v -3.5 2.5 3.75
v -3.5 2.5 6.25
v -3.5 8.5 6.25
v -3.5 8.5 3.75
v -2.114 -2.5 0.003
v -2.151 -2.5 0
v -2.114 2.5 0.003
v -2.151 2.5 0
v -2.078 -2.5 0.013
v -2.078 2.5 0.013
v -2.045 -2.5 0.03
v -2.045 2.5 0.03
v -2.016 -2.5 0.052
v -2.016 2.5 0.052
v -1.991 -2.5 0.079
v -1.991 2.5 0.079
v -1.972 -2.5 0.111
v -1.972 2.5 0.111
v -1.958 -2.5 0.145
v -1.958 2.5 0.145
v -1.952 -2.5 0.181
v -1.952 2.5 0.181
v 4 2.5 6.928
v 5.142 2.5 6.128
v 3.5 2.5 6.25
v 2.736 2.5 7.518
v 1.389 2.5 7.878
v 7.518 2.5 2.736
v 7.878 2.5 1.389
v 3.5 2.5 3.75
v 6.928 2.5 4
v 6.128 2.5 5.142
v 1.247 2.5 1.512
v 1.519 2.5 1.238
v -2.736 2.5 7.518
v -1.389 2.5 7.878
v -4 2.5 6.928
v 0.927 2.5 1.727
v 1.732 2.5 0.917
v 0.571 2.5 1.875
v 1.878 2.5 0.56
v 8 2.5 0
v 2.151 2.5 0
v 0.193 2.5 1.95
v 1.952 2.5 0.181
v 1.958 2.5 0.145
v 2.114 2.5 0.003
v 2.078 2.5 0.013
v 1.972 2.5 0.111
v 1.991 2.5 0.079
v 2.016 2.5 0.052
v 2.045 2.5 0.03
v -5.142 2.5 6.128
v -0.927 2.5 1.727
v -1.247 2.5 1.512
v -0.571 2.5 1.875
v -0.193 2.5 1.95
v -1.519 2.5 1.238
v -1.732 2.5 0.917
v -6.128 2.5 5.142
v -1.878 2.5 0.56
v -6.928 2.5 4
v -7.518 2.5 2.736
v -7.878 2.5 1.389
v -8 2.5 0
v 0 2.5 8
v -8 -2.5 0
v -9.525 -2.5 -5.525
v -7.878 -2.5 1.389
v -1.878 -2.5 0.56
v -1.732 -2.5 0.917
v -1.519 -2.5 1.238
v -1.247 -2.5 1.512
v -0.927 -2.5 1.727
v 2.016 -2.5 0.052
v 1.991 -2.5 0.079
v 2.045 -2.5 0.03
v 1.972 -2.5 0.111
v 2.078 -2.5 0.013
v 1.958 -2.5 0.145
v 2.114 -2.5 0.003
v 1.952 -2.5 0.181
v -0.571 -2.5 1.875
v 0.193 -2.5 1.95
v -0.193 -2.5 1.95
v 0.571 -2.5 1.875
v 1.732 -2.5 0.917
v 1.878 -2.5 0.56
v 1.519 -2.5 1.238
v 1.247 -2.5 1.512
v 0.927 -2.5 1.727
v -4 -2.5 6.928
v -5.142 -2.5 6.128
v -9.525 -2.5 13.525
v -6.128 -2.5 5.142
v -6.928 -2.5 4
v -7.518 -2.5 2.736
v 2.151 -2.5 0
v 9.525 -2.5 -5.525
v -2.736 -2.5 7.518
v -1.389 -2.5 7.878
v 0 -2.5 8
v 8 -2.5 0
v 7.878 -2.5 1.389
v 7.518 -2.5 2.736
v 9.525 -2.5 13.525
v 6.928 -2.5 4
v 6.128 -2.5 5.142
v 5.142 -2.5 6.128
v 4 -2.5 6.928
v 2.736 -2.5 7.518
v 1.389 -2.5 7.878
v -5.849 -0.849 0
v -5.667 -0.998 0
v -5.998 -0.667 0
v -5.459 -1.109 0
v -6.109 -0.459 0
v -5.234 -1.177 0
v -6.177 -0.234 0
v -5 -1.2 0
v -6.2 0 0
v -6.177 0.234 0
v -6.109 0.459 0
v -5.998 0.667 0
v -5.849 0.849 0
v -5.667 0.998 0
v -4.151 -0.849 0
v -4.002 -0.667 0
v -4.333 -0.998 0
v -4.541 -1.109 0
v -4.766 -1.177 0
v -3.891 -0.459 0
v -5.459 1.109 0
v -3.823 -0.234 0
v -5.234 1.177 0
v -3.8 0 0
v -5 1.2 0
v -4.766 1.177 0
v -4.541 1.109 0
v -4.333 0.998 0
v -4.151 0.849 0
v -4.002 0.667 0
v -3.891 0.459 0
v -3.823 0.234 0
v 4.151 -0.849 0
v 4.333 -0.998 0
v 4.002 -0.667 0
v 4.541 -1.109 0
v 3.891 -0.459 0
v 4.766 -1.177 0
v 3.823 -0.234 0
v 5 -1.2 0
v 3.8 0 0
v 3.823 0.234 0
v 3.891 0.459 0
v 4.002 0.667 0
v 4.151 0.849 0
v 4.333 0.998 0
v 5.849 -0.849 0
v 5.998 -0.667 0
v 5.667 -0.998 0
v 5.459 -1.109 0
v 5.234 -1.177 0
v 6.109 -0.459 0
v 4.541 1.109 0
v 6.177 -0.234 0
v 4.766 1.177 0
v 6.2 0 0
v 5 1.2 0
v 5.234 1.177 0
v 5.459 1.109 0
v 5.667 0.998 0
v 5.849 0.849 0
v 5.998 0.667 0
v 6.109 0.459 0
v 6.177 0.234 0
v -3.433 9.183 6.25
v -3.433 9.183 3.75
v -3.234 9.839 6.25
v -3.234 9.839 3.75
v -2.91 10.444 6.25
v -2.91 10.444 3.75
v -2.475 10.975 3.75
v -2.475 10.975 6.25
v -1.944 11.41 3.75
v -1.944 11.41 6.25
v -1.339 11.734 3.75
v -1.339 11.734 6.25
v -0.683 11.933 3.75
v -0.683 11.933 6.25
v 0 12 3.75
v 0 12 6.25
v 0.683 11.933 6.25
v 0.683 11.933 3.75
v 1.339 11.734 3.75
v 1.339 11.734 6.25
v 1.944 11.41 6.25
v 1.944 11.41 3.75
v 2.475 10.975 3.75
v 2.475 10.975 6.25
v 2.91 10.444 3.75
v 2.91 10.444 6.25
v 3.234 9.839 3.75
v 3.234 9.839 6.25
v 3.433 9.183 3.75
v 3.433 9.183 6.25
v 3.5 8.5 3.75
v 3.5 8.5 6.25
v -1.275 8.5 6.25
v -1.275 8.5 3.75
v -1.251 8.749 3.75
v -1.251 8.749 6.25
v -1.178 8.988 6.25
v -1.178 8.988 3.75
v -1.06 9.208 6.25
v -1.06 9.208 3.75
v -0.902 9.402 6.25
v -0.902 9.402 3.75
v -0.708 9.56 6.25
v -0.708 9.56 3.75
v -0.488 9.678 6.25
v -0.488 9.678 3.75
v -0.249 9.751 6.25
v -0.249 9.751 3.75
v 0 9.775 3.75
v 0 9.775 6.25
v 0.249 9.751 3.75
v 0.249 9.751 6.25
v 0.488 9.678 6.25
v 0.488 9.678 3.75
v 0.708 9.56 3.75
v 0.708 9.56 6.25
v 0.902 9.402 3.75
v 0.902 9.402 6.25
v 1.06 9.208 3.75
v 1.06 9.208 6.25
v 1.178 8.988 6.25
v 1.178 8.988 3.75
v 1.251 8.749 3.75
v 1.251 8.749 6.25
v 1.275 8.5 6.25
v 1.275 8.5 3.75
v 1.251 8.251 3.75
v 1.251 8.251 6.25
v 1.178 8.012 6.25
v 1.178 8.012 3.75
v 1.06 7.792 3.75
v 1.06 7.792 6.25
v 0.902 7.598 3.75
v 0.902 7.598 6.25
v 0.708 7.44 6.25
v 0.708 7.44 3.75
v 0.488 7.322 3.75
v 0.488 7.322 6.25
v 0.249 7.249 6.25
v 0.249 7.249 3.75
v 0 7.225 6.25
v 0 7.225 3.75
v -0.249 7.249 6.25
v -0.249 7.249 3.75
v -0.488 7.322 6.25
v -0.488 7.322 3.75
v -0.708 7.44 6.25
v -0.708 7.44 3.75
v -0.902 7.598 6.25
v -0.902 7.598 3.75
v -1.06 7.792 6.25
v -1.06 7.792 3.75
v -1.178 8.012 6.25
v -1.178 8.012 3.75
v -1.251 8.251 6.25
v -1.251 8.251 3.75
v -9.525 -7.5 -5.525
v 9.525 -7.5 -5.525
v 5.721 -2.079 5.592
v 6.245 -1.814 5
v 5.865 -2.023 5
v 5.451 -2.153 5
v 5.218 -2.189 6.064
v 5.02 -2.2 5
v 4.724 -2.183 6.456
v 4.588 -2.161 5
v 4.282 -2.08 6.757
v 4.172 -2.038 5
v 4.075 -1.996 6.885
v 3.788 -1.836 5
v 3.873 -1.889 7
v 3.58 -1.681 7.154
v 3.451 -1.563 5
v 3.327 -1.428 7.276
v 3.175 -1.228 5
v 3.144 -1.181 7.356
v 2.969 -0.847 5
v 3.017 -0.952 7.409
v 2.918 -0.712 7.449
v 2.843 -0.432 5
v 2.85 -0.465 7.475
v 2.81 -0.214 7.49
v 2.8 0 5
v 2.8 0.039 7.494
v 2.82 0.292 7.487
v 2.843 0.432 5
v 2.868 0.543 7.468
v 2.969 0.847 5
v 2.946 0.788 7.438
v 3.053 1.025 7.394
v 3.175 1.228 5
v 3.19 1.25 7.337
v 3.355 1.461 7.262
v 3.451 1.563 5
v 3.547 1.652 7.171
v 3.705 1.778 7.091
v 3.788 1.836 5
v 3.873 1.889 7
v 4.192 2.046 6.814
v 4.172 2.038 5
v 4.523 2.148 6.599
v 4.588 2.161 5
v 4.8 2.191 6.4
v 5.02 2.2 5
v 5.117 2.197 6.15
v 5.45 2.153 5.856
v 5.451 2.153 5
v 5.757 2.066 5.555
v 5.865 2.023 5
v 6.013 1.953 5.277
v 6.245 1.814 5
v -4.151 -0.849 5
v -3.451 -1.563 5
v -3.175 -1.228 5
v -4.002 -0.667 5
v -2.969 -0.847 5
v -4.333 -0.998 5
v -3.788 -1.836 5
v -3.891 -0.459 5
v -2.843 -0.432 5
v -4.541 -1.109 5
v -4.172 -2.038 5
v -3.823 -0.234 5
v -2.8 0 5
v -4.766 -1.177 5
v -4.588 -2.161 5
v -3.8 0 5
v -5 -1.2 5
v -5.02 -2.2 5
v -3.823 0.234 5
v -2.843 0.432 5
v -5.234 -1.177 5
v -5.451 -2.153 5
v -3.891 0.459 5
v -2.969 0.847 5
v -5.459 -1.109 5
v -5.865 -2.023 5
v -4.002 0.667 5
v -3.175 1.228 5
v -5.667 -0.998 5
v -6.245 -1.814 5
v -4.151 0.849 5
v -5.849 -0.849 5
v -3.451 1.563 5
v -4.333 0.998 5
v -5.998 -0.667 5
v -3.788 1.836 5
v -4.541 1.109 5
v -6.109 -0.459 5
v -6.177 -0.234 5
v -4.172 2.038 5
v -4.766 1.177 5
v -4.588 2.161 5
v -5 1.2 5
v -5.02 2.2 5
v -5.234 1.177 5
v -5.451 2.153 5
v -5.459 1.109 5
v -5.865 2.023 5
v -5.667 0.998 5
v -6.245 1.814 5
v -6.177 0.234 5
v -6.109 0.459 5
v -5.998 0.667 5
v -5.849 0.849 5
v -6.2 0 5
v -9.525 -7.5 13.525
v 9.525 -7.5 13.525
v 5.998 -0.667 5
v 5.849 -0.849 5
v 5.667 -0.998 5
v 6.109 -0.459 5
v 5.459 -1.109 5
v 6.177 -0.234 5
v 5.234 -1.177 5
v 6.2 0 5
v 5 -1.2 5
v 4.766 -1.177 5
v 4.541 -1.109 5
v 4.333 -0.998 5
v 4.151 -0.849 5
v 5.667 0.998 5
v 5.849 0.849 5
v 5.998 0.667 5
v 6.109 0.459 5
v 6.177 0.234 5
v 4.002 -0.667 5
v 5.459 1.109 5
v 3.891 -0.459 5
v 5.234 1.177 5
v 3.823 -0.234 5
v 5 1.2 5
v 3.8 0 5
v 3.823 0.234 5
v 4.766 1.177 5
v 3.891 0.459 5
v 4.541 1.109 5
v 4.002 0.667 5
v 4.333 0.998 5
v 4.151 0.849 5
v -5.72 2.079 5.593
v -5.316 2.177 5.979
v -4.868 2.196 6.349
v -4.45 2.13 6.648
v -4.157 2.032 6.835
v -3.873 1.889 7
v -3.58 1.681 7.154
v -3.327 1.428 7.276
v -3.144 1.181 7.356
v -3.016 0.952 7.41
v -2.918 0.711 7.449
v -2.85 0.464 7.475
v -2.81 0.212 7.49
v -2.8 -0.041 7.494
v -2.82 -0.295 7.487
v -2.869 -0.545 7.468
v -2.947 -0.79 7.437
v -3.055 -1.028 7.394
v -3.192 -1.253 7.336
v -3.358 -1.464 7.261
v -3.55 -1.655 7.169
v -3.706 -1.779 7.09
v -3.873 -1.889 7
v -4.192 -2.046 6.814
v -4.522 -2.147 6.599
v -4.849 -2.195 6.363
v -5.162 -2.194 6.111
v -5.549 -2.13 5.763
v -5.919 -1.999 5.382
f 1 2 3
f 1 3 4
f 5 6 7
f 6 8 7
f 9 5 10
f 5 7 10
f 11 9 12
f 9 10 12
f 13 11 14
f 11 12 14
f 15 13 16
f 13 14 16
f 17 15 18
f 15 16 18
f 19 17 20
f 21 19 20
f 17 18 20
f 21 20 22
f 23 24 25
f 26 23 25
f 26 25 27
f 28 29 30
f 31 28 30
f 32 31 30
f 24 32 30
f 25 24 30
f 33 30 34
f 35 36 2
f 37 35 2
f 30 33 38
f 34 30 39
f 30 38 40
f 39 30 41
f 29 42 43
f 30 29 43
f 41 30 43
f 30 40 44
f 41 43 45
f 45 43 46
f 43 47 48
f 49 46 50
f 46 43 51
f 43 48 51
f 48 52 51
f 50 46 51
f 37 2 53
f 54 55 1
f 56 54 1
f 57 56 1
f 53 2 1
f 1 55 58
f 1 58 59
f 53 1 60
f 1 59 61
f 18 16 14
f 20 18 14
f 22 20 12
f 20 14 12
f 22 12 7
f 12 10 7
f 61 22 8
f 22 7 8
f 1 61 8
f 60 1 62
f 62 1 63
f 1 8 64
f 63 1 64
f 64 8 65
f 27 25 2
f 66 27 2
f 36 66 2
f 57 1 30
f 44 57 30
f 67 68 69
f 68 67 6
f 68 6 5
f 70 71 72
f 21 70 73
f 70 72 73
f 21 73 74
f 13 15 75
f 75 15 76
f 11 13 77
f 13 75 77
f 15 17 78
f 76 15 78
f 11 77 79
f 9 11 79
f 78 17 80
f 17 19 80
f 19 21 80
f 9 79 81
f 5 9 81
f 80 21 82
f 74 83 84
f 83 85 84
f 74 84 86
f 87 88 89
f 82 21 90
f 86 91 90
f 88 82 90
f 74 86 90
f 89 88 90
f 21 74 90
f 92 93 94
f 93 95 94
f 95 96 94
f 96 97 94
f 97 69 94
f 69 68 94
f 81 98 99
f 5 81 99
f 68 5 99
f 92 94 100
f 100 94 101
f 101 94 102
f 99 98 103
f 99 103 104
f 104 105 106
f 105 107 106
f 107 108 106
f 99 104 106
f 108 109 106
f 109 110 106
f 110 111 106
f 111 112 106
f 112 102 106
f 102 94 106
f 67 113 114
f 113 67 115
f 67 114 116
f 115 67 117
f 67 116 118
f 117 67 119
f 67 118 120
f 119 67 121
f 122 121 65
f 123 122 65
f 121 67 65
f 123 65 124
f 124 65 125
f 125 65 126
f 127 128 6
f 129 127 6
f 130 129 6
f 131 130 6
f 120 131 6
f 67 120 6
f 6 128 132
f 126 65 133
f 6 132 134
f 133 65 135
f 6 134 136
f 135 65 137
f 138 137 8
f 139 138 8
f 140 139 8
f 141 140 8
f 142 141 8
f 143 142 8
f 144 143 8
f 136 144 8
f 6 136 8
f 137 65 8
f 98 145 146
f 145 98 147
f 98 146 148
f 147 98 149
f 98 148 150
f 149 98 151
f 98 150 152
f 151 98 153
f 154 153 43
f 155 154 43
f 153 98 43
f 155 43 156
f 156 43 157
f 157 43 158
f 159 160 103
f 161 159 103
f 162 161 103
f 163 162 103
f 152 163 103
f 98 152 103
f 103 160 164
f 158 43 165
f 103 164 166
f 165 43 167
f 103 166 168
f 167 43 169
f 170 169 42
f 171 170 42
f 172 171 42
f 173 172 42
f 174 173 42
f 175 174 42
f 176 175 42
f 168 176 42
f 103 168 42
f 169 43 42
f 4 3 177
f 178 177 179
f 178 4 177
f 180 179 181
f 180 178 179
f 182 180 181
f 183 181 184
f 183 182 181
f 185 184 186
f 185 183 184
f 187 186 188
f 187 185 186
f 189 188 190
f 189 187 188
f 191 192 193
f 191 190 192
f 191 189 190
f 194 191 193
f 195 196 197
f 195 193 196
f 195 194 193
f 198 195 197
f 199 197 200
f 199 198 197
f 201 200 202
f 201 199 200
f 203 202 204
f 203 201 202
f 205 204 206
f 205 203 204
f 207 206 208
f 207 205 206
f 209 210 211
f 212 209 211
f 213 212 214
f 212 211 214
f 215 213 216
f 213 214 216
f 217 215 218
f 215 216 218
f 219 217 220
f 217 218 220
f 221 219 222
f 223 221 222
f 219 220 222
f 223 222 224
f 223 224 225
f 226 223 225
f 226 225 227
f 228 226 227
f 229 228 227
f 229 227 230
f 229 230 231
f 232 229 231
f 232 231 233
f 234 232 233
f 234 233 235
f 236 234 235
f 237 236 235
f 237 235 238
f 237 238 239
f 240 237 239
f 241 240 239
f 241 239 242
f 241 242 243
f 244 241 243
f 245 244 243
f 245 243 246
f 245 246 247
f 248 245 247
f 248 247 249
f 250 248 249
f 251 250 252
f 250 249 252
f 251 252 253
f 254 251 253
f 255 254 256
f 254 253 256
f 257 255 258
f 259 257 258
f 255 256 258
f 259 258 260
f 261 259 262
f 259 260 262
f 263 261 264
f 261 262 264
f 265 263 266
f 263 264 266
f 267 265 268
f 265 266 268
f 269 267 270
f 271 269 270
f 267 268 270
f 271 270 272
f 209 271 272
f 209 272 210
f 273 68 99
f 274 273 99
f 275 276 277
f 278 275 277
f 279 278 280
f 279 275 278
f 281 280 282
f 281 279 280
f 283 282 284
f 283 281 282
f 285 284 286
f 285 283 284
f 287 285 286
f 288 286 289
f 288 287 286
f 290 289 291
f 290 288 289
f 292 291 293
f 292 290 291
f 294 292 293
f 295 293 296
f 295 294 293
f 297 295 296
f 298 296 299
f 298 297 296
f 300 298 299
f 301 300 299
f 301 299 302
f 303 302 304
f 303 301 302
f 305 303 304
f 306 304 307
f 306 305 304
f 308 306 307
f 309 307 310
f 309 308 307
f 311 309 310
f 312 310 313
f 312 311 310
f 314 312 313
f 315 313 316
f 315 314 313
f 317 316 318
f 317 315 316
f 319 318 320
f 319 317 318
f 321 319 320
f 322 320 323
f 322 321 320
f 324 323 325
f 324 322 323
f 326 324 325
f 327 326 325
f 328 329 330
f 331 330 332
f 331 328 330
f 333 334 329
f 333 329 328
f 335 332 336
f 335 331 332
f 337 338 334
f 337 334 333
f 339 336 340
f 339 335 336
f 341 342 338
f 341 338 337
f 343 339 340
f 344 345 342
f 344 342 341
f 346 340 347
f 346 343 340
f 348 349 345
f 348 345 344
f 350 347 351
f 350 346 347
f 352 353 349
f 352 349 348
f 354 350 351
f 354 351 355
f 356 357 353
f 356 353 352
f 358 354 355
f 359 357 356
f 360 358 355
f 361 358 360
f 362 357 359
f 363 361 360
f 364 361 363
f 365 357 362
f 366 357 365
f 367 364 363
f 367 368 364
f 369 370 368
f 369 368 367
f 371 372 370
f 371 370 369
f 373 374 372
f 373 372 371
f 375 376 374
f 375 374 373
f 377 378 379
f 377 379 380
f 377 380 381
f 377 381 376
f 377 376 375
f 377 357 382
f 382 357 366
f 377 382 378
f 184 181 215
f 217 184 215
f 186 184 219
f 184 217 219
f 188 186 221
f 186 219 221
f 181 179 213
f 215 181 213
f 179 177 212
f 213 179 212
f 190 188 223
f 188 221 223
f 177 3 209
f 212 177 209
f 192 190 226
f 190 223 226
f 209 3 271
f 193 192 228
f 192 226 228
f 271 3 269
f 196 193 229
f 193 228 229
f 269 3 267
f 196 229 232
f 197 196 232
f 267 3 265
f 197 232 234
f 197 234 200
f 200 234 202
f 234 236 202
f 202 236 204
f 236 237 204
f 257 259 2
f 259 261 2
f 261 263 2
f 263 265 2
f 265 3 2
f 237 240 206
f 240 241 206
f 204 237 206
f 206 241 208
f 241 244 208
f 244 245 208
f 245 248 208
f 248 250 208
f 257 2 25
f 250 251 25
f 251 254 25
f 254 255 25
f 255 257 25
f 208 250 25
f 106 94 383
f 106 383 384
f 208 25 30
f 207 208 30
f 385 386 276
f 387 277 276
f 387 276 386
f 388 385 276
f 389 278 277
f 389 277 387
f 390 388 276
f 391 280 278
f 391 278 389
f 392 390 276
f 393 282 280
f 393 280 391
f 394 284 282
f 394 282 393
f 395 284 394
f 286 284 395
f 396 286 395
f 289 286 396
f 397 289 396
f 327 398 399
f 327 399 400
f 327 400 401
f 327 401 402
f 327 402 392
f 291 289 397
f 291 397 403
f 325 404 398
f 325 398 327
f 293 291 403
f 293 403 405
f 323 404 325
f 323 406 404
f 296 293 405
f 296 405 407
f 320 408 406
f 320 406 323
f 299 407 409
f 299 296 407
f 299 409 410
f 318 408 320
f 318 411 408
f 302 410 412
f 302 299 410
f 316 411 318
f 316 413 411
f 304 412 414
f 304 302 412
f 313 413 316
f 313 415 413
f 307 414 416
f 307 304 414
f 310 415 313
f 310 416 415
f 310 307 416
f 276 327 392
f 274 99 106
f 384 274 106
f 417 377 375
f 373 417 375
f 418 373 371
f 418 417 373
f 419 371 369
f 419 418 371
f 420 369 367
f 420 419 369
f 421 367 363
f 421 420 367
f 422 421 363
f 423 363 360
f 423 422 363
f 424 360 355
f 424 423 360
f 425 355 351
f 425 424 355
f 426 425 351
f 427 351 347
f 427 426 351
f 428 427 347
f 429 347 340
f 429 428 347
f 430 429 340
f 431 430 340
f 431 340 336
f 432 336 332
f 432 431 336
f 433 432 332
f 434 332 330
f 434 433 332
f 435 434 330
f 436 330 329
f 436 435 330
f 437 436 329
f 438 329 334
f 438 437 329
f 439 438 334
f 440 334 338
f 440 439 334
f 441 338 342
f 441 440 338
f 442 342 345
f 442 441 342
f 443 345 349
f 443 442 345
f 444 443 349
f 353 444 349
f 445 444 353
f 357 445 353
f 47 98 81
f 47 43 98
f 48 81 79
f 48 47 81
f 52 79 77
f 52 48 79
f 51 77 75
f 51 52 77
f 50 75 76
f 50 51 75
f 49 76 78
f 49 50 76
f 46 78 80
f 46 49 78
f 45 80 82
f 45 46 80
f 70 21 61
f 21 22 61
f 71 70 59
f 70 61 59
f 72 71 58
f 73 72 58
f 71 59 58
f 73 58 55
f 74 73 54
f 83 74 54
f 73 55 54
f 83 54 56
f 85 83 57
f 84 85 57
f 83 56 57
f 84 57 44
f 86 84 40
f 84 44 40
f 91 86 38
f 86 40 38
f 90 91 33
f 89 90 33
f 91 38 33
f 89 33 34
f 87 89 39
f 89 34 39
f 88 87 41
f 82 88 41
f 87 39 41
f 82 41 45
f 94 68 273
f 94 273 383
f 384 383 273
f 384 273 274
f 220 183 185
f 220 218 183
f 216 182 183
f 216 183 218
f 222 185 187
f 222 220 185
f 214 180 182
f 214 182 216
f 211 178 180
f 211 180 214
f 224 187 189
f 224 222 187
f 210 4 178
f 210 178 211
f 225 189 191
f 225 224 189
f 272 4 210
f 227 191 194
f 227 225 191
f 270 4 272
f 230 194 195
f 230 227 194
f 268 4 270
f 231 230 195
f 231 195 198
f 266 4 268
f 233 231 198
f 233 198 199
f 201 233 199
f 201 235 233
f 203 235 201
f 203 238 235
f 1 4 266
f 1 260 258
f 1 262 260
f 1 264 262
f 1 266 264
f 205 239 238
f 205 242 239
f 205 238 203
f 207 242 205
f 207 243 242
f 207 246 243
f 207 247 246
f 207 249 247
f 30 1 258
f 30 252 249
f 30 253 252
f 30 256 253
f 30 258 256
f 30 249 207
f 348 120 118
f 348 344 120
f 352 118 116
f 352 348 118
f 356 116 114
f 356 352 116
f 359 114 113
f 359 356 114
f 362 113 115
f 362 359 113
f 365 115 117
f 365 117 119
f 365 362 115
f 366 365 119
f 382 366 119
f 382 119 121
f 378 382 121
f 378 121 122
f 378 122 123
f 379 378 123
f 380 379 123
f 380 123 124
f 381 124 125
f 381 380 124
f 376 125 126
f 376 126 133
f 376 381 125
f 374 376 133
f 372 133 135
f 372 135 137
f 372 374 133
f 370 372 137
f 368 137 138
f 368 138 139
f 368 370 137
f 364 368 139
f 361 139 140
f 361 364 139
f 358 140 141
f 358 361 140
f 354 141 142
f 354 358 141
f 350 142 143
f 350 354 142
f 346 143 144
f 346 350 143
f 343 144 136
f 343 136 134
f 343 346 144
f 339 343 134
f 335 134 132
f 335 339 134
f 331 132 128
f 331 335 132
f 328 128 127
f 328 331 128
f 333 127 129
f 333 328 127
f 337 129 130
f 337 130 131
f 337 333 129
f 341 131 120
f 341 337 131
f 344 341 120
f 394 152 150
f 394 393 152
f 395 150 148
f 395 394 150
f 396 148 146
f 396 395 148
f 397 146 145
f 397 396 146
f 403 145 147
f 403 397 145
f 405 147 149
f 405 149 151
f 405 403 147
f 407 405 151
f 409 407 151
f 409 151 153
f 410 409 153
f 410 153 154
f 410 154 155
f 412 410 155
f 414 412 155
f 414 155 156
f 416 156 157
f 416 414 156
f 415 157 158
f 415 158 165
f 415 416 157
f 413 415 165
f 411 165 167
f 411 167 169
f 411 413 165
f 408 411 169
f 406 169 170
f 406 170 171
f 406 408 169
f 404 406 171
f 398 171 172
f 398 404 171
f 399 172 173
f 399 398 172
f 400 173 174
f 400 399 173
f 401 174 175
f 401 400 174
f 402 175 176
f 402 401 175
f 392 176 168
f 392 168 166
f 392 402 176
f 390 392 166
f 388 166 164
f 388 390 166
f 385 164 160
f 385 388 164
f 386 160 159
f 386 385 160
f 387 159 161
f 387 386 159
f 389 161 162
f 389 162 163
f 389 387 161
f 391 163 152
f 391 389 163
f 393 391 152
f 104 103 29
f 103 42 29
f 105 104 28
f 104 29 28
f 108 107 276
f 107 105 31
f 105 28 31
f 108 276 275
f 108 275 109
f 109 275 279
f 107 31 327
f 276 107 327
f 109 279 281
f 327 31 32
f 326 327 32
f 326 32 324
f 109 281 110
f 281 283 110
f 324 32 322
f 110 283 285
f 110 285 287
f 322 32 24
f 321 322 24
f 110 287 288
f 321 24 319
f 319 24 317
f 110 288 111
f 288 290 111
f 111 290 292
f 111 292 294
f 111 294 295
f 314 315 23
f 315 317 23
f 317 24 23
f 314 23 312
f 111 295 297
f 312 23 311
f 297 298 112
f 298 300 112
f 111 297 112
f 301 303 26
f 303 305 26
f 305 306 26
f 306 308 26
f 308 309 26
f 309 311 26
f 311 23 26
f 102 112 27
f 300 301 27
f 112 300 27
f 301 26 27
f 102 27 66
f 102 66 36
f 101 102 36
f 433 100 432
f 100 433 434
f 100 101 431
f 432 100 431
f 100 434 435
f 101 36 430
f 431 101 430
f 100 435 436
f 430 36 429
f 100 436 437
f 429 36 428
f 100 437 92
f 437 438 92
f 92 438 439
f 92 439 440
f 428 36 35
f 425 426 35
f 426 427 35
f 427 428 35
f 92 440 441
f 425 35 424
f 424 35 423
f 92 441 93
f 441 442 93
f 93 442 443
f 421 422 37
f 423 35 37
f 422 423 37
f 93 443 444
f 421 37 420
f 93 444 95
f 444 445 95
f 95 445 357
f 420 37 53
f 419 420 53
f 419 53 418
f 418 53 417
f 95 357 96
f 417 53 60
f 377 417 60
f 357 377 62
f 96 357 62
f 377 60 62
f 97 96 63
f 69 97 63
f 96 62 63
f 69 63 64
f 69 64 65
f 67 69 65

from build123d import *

# Parameters (mm, degrees)
BOSS_EXTRUDE1_DEPTH           = 2.5
SKETCH2_W                     = 7
SKETCH2_H                     = 2.5
BOSS_EXTRUDE2_DEPTH           = 9.5
CUT_EXTRUDE1_DEPTH            = 9.5
SKETCH4_R                     = 1.275
CUT_EXTRUDE2_DEPTH            = 9.5
CBORE_FOR_M2_SHCS1_AT_2_COUNT = 2
CBORE_FOR_M2_SHCS1_AT_2_PITCH = 10
SKETCH8_R                     = 2.2
CUT_EXTRUDE3_DEPTH            = 9.5
SKETCH11_W                    = 19.05
SKETCH11_H                    = 19.05
BOSS_EXTRUDE3_DEPTH           = 5
FILLET1_R                     = 0.2


with BuildPart() as part:
    # Sketch1 → Boss-Extrude1 (new body, symmetric)
    with BuildSketch(Plane(origin=(0, 0, 0), x_dir=(1, 0, 0), z_dir=(0, 1, 0))):
        with BuildLine():
            Line((1.96, 0), (8, 0))
            ThreePointArc((8, 0), (0, -8), (-8, 0))
            Line((-8, 0), (-1.96, 0))
            ThreePointArc((-1.96, 0), (0, -1.96), (1.96, 0))
        make_face()
    extrude(amount=BOSS_EXTRUDE1_DEPTH, both=True)

    # Sketch2 → Boss-Extrude2 (add)
    with BuildSketch(Plane(origin=(0, 2.5, 0), x_dir=(1, 0, 0), z_dir=(0, 1, 0))):
        with Locations((0, -5)):
            Rectangle(SKETCH2_W, SKETCH2_H)
    extrude(amount=BOSS_EXTRUDE2_DEPTH)

    # Sketch3 → Cut-Extrude1 (cut)
    with BuildSketch(Plane(origin=(0, 0, 3.75), x_dir=(-1, 0, 0), z_dir=(0, 0, -1))):
        with BuildLine():
            Line((-3.5, 8.5), (-3.5, 14.886359519))
            Line((-3.5, 14.886359519), (0, 16.809201746))
            Line((0, 16.809201746), (3.5, 14.5))
            Line((3.5, 14.5), (3.5, 8.5))
            ThreePointArc((3.5, 8.5), (0, 12), (-3.5, 8.5))
        make_face()
    extrude(amount=-CUT_EXTRUDE1_DEPTH, mode=Mode.SUBTRACT)

    # Sketch4 → Cut-Extrude2 (cut)
    with BuildSketch(Plane(origin=(0, 0, 3.75), x_dir=(-1, 0, 0), z_dir=(0, 0, -1))):
        with Locations((0, 8.5)):
            Circle(SKETCH4_R)
    extrude(amount=-CUT_EXTRUDE2_DEPTH, mode=Mode.SUBTRACT)

    # Sketch7 → CBORE for M2 SHCS1 (revolve, cut)
    with BuildSketch(Plane(origin=(5, 0, 7), x_dir=(0, -1, 0), z_dir=(1, 0, 0))):
        Polygon((0, 0), (0, 7), (1.2, 7), (1.2, 2), (2.2, 2), (2.2, 0), align=None)
    cbore_for_m2_shcs1 = revolve(axis=Axis((5, 0, 13.35), (0, 0, -1)), mode=Mode.SUBTRACT)

    # CBORE for M2 SHCS1 at 2: CBORE for M2 SHCS1 ×2
    with Locations(*[(-i * CBORE_FOR_M2_SHCS1_AT_2_PITCH, 0, 0) for i in range(1, CBORE_FOR_M2_SHCS1_AT_2_COUNT)]):
        add(cbore_for_m2_shcs1, mode=Mode.SUBTRACT)

    # Sketch8 → Cut-Extrude3 (cut)
    with BuildSketch(Plane(origin=(0, 0, 7), x_dir=(-1, 0, 0), z_dir=(0, 0, -1))):
        with Locations((-5, 0)):
            Circle(SKETCH8_R)
        with Locations((5, 0)):
            Circle(SKETCH8_R)
    extrude(amount=-CUT_EXTRUDE3_DEPTH, mode=Mode.SUBTRACT)

    # Sketch11 → Boss-Extrude3 (add)
    with BuildSketch(Plane.XZ.offset(2.5)):
        with Locations((0, 4)):
            Rectangle(SKETCH11_W, SKETCH11_H)
    extrude(amount=BOSS_EXTRUDE3_DEPTH)

    # Fillet1
    fillet1_edges = [part.edges().sort_by_distance(p)[0] for p in [
        (1.96, 0, 0),
        (-1.96, 0, 0),
    ]]
    fillet(fillet1_edges, radius=FILLET1_R)


solid = part.part
